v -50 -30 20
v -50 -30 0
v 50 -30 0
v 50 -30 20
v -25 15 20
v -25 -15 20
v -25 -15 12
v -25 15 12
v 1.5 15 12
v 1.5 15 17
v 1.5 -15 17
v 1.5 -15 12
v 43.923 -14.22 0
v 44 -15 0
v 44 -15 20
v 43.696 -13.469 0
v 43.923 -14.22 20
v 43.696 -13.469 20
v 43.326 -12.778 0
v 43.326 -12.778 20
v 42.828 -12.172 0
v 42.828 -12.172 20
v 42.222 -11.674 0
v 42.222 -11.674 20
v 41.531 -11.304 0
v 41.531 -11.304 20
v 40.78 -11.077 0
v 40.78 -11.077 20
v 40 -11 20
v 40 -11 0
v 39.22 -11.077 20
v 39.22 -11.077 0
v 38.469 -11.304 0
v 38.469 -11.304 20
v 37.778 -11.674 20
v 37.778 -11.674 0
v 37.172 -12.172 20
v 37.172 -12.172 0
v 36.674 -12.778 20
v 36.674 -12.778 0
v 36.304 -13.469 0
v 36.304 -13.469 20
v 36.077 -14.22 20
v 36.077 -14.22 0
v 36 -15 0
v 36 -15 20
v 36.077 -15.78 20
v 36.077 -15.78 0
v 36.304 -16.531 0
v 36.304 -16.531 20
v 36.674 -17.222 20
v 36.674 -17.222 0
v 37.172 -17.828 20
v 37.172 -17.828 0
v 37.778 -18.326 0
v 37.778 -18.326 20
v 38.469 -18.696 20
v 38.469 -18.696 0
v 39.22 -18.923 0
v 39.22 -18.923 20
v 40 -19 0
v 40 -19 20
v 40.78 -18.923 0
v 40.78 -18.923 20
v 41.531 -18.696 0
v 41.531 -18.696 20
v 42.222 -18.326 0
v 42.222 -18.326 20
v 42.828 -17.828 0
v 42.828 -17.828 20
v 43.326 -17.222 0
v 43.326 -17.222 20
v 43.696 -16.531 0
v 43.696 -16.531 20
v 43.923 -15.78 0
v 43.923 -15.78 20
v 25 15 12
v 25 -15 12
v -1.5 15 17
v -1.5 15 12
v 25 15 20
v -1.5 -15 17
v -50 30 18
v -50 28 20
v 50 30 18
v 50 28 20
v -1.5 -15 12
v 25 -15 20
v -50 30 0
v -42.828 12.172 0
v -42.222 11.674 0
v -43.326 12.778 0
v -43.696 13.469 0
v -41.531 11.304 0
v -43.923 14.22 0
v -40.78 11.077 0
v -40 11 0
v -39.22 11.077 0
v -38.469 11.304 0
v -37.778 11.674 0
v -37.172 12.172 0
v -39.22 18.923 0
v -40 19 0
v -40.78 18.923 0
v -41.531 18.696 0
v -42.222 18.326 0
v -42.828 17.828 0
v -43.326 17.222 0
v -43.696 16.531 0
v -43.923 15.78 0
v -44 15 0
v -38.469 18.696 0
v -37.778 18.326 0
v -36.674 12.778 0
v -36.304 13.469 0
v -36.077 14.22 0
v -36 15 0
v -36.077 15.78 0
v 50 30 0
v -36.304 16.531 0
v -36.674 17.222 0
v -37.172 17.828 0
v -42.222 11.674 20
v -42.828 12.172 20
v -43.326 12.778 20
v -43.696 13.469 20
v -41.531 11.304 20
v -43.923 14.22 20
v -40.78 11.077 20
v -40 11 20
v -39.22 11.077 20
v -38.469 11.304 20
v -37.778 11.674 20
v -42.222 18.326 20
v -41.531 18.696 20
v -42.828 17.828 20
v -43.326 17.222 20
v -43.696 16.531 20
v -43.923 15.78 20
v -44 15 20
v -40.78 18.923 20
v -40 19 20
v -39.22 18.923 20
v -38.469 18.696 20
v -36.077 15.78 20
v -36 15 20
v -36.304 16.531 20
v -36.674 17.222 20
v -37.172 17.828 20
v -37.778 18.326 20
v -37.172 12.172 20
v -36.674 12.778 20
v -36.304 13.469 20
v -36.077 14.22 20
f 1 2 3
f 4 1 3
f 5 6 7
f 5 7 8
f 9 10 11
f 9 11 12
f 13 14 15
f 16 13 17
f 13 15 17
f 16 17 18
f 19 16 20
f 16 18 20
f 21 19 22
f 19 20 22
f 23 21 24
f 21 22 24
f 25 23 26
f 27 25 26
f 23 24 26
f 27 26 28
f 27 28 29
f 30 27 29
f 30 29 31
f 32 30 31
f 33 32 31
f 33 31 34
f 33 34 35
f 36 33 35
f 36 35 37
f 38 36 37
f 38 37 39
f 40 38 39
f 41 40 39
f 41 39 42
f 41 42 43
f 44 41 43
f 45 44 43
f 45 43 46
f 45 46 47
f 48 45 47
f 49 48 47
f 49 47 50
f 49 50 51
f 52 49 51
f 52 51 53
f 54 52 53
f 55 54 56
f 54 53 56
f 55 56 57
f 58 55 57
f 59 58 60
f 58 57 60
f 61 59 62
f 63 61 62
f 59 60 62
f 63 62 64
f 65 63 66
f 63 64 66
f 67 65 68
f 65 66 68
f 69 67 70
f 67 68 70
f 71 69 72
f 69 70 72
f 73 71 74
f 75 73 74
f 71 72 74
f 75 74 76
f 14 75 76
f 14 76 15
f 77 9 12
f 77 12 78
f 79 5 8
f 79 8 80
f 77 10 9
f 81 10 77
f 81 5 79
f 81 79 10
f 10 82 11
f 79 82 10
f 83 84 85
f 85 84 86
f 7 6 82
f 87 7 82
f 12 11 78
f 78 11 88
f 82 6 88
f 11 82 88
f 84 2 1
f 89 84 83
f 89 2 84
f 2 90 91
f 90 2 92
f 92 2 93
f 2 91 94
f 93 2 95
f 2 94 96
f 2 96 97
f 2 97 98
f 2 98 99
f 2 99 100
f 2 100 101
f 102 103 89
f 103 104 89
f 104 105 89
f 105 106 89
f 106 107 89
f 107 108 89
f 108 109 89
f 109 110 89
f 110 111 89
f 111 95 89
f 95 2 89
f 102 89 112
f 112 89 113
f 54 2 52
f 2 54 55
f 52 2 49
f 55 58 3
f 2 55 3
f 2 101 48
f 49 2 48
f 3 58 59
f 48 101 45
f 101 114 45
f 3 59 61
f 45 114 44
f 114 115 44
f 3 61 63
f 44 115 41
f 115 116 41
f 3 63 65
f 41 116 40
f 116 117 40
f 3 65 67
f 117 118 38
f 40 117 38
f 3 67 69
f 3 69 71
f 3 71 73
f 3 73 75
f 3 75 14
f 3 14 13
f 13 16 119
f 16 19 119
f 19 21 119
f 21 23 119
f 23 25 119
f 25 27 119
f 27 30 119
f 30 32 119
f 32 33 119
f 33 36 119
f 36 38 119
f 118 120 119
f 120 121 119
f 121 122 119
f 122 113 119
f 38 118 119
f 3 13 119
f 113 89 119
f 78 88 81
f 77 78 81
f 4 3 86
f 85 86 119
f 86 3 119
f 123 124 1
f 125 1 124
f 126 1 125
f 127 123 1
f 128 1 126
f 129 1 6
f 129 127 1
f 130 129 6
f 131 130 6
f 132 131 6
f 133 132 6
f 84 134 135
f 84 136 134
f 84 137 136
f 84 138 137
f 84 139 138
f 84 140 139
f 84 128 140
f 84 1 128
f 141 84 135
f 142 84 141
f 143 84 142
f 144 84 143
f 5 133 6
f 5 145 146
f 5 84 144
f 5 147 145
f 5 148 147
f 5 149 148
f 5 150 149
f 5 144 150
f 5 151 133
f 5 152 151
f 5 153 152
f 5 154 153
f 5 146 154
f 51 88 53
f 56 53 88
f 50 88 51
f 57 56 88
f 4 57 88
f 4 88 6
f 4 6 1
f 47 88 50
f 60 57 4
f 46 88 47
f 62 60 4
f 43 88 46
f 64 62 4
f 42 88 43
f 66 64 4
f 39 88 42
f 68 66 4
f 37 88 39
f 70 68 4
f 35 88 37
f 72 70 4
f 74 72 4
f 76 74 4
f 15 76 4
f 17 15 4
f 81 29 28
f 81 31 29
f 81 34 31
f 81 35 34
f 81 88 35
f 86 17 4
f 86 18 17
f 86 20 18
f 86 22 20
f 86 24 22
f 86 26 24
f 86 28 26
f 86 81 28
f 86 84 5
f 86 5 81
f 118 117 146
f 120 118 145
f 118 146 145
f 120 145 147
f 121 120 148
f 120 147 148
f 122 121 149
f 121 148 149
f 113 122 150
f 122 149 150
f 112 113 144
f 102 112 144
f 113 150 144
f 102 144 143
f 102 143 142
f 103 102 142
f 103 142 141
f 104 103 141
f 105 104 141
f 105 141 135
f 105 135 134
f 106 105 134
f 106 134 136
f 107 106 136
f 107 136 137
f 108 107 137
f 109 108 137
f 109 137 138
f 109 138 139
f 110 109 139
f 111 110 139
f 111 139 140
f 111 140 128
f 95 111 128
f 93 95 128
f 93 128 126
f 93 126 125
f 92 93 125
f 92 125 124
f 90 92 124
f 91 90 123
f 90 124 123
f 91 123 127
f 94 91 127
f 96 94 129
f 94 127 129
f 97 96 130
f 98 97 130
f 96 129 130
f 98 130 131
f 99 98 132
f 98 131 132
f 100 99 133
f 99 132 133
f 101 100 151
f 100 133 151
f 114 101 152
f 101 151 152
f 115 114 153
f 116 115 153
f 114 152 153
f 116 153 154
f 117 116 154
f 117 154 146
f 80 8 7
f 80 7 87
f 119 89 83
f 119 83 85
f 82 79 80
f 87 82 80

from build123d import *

# Parameters (mm, degrees)
SKIZZE1_W                       = 100
SKIZZE1_H                       = 60
AUFSATZ_LINEAR_AUSTRAGEN1_DEPTH = 20
SKIZZE2_W                       = 50
SKIZZE2_H                       = 30
SCHNITT_LINEAR_AUSTRAGEN1_DEPTH = 8
SKIZZE3_R                       = 4
SCHNITT_LINEAR_AUSTRAGEN2_DEPTH = 62.64414003
SKIZZE4_R                       = 4
SCHNITT_LINEAR_AUSTRAGEN3_DEPTH = 62.64414003
VERST_RKUNGSRIPPE1_REACH        = 63.644
SKIZZE5_WALL_W                  = 145.28828006
SKIZZE5_WALL_H                  = 3
FASE1_SIZE                      = 2


with BuildPart() as part:
    # Skizze1 → Aufsatz-Linear austragen1 (new body)
    with BuildSketch(Plane.XY):
        Rectangle(SKIZZE1_W, SKIZZE1_H)
    extrude(amount=AUFSATZ_LINEAR_AUSTRAGEN1_DEPTH)

    # Skizze2 → Schnitt-Linear austragen1 (cut)
    with BuildSketch(Plane.XY.offset(20)):
        Rectangle(SKIZZE2_W, SKIZZE2_H)
    extrude(amount=-SCHNITT_LINEAR_AUSTRAGEN1_DEPTH, mode=Mode.SUBTRACT)

    # Skizze3 → Schnitt-Linear austragen2 (cut, through all)
    with BuildSketch(Plane.XY.offset(20)):
        with Locations((-40, 15)):
            Circle(SKIZZE3_R)
    extrude(amount=-SCHNITT_LINEAR_AUSTRAGEN2_DEPTH, mode=Mode.SUBTRACT)

    # Skizze4 → Schnitt-Linear austragen3 (cut, through all)
    with BuildSketch(Plane.XY.offset(20)):
        with Locations((40, -15)):
            Circle(SKIZZE4_R)
    extrude(amount=-SCHNITT_LINEAR_AUSTRAGEN3_DEPTH, mode=Mode.SUBTRACT)

    # Skizze5 wall → Verstärkungsrippe1 (add, up to next)
    with BuildSketch(Plane(origin=(0, 0, 17), x_dir=(0, 1, 0), z_dir=(0, 0, 1)), mode=Mode.PRIVATE) as verst_rkungsrippe1_sk1:
        Rectangle(SKIZZE5_WALL_W, SKIZZE5_WALL_H)
    verst_rkungsrippe1_tool1 = extrude(verst_rkungsrippe1_sk1.sketch, amount=-VERST_RKUNGSRIPPE1_REACH, mode=Mode.PRIVATE) - part.part
    add(verst_rkungsrippe1_tool1.solids().sort_by_distance((0, 0, 17))[0])

    # Fase1
    fase1_edges = [part.edges().sort_by_distance(p)[0] for p in [
        (0, 30, 20),
    ]]
    chamfer(fase1_edges, length=FASE1_SIZE)


solid = part.part
